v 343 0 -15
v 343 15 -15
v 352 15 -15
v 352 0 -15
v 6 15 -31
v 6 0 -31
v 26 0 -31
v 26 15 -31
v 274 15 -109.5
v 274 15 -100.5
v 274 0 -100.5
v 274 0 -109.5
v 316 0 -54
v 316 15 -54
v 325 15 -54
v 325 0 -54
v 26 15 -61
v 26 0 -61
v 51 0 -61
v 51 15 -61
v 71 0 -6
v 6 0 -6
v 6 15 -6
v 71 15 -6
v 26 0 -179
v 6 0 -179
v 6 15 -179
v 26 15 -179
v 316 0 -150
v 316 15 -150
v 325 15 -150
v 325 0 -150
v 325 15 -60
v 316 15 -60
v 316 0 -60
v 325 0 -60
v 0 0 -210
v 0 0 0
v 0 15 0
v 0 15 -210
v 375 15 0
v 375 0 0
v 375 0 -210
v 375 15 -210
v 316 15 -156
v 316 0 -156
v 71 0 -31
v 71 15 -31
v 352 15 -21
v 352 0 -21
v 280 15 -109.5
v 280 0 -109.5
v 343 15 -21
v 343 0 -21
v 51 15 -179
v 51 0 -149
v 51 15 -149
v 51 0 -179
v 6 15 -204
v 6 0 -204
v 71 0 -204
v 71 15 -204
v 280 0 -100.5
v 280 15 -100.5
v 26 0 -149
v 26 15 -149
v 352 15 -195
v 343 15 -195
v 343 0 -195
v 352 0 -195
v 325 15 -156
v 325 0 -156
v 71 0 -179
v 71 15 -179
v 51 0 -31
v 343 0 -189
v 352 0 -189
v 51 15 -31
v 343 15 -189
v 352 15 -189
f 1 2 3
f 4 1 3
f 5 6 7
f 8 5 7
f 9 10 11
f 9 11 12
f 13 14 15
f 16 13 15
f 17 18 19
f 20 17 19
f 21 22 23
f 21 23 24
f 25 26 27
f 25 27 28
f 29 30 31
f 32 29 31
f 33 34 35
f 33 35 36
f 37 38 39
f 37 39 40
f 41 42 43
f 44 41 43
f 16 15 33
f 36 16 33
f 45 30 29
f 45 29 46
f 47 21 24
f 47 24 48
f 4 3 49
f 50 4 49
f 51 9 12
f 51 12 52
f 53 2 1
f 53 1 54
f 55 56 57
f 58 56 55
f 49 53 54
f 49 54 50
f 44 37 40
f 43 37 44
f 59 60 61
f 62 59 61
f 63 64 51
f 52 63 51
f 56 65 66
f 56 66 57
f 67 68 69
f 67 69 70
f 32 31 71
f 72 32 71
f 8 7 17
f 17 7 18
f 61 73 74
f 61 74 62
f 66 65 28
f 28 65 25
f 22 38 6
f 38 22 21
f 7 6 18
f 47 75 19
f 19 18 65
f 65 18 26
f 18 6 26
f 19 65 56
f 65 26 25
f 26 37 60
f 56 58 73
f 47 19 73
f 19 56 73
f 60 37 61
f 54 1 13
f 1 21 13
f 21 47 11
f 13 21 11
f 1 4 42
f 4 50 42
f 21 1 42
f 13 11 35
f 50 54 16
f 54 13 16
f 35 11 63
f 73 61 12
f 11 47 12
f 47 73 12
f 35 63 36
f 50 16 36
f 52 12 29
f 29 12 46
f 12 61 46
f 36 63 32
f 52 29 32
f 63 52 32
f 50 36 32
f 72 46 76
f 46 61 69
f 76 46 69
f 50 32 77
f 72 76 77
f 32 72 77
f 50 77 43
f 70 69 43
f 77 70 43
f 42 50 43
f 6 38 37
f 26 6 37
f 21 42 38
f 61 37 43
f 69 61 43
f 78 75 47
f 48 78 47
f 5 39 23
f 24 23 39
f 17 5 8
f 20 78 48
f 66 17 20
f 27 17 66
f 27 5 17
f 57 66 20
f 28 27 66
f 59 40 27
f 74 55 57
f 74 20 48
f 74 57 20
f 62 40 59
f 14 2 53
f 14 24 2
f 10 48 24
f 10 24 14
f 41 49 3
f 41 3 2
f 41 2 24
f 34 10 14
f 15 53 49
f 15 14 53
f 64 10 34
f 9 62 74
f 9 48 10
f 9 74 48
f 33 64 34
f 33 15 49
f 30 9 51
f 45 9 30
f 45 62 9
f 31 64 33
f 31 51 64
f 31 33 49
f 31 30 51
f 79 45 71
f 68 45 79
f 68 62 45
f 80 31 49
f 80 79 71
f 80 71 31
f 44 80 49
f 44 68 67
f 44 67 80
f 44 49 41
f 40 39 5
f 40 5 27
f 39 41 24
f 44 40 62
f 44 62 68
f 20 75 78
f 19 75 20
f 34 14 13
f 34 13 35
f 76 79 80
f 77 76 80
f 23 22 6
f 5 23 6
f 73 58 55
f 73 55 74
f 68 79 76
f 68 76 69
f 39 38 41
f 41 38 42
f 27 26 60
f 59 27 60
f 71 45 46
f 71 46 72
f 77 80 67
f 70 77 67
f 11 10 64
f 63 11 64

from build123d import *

# Parameters (mm, degrees)
SKETCH1_W           = 375
SKETCH1_H           = 210
BOSS_EXTRUDE1_DEPTH = 15
SKETCH1_5_W         = 25
SKETCH1_5_H         = 30
CUT_EXTRUDE2_DEPTH  = 34
SKETCH1_6_W         = 65
SKETCH1_6_H         = 25
CUT_EXTRUDE3_DEPTH  = 46
SKETCH1_7_W         = 65
SKETCH1_7_H         = 25
CUT_EXTRUDE4_DEPTH  = 48
SKETCH1_8_W         = 25
SKETCH1_8_H         = 30
CUT_EXTRUDE5_DEPTH  = 45
SKETCH1_9_W         = 9
SKETCH1_9_H         = 6
CUT_EXTRUDE6_DEPTH  = 34
SKETCH1_10_W        = 9
SKETCH1_10_H        = 6
CUT_EXTRUDE7_DEPTH  = 31
SKETCH1_11_W        = 6
SKETCH1_11_H        = 9
CUT_EXTRUDE8_DEPTH  = 34
SKETCH1_12_W        = 9
SKETCH1_12_H        = 6
CUT_EXTRUDE9_DEPTH  = 27
SKETCH1_13_W        = 9
SKETCH1_13_H        = 6
CUT_EXTRUDE10_DEPTH = 31


with BuildPart() as part:
    # Sketch1 → Boss-Extrude1 (new body)
    with BuildSketch(Plane(origin=(0, 0, 0), x_dir=(1, 0, 0), z_dir=(0, 1, 0))):
        with Locations((187.5, 105)):
            Rectangle(SKETCH1_W, SKETCH1_H)
    extrude(amount=BOSS_EXTRUDE1_DEPTH)

    # Sketch1<5> → Cut-Extrude2 (cut)
    with BuildSketch(Plane(origin=(0, 0, 0), x_dir=(1, 0, 0), z_dir=(0, 1, 0))):
        with Locations((38.5, 164)):
            Rectangle(SKETCH1_5_W, SKETCH1_5_H)
    extrude(amount=CUT_EXTRUDE2_DEPTH, mode=Mode.SUBTRACT)

    # Sketch1<6> → Cut-Extrude3 (cut)
    with BuildSketch(Plane(origin=(0, 0, 0), x_dir=(1, 0, 0), z_dir=(0, 1, 0))):
        with Locations((38.5, 191.5)):
            Rectangle(SKETCH1_6_W, SKETCH1_6_H)
    extrude(amount=CUT_EXTRUDE3_DEPTH, mode=Mode.SUBTRACT)

    # Sketch1<7> → Cut-Extrude4 (cut)
    with BuildSketch(Plane(origin=(0, 0, 0), x_dir=(1, 0, 0), z_dir=(0, 1, 0))):
        with Locations((38.5, 18.5)):
            Rectangle(SKETCH1_7_W, SKETCH1_7_H)
    extrude(amount=CUT_EXTRUDE4_DEPTH, mode=Mode.SUBTRACT)

    # Sketch1<8> → Cut-Extrude5 (cut)
    with BuildSketch(Plane(origin=(0, 0, 0), x_dir=(1, 0, 0), z_dir=(0, 1, 0))):
        with Locations((38.5, 46)):
            Rectangle(SKETCH1_8_W, SKETCH1_8_H)
    extrude(amount=CUT_EXTRUDE5_DEPTH, mode=Mode.SUBTRACT)

    # Sketch1<9> → Cut-Extrude6 (cut)
    with BuildSketch(Plane(origin=(0, 0, 0), x_dir=(1, 0, 0), z_dir=(0, 1, 0))):
        with Locations((347.5, 18)):
            Rectangle(SKETCH1_9_W, SKETCH1_9_H)
    extrude(amount=CUT_EXTRUDE6_DEPTH, mode=Mode.SUBTRACT)

    # Sketch1<10> → Cut-Extrude7 (cut)
    with BuildSketch(Plane(origin=(0, 0, 0), x_dir=(1, 0, 0), z_dir=(0, 1, 0))):
        with Locations((320.5, 57)):
            Rectangle(SKETCH1_10_W, SKETCH1_10_H)
    extrude(amount=CUT_EXTRUDE7_DEPTH, mode=Mode.SUBTRACT)

    # Sketch1<11> → Cut-Extrude8 (cut)
    with BuildSketch(Plane(origin=(0, 0, 0), x_dir=(1, 0, 0), z_dir=(0, 1, 0))):
        with Locations((277, 105)):
            Rectangle(SKETCH1_11_W, SKETCH1_11_H)
    extrude(amount=CUT_EXTRUDE8_DEPTH, mode=Mode.SUBTRACT)

    # Sketch1<12> → Cut-Extrude9 (cut)
    with BuildSketch(Plane(origin=(0, 0, 0), x_dir=(1, 0, 0), z_dir=(0, 1, 0))):
        with Locations((320.5, 153)):
            Rectangle(SKETCH1_12_W, SKETCH1_12_H)
    extrude(amount=CUT_EXTRUDE9_DEPTH, mode=Mode.SUBTRACT)

    # Sketch1<13> → Cut-Extrude10 (cut)
    with BuildSketch(Plane(origin=(0, 0, 0), x_dir=(1, 0, 0), z_dir=(0, 1, 0))):
        with Locations((347.5, 192)):
            Rectangle(SKETCH1_13_W, SKETCH1_13_H)
    extrude(amount=CUT_EXTRUDE10_DEPTH, mode=Mode.SUBTRACT)


solid = part.part
